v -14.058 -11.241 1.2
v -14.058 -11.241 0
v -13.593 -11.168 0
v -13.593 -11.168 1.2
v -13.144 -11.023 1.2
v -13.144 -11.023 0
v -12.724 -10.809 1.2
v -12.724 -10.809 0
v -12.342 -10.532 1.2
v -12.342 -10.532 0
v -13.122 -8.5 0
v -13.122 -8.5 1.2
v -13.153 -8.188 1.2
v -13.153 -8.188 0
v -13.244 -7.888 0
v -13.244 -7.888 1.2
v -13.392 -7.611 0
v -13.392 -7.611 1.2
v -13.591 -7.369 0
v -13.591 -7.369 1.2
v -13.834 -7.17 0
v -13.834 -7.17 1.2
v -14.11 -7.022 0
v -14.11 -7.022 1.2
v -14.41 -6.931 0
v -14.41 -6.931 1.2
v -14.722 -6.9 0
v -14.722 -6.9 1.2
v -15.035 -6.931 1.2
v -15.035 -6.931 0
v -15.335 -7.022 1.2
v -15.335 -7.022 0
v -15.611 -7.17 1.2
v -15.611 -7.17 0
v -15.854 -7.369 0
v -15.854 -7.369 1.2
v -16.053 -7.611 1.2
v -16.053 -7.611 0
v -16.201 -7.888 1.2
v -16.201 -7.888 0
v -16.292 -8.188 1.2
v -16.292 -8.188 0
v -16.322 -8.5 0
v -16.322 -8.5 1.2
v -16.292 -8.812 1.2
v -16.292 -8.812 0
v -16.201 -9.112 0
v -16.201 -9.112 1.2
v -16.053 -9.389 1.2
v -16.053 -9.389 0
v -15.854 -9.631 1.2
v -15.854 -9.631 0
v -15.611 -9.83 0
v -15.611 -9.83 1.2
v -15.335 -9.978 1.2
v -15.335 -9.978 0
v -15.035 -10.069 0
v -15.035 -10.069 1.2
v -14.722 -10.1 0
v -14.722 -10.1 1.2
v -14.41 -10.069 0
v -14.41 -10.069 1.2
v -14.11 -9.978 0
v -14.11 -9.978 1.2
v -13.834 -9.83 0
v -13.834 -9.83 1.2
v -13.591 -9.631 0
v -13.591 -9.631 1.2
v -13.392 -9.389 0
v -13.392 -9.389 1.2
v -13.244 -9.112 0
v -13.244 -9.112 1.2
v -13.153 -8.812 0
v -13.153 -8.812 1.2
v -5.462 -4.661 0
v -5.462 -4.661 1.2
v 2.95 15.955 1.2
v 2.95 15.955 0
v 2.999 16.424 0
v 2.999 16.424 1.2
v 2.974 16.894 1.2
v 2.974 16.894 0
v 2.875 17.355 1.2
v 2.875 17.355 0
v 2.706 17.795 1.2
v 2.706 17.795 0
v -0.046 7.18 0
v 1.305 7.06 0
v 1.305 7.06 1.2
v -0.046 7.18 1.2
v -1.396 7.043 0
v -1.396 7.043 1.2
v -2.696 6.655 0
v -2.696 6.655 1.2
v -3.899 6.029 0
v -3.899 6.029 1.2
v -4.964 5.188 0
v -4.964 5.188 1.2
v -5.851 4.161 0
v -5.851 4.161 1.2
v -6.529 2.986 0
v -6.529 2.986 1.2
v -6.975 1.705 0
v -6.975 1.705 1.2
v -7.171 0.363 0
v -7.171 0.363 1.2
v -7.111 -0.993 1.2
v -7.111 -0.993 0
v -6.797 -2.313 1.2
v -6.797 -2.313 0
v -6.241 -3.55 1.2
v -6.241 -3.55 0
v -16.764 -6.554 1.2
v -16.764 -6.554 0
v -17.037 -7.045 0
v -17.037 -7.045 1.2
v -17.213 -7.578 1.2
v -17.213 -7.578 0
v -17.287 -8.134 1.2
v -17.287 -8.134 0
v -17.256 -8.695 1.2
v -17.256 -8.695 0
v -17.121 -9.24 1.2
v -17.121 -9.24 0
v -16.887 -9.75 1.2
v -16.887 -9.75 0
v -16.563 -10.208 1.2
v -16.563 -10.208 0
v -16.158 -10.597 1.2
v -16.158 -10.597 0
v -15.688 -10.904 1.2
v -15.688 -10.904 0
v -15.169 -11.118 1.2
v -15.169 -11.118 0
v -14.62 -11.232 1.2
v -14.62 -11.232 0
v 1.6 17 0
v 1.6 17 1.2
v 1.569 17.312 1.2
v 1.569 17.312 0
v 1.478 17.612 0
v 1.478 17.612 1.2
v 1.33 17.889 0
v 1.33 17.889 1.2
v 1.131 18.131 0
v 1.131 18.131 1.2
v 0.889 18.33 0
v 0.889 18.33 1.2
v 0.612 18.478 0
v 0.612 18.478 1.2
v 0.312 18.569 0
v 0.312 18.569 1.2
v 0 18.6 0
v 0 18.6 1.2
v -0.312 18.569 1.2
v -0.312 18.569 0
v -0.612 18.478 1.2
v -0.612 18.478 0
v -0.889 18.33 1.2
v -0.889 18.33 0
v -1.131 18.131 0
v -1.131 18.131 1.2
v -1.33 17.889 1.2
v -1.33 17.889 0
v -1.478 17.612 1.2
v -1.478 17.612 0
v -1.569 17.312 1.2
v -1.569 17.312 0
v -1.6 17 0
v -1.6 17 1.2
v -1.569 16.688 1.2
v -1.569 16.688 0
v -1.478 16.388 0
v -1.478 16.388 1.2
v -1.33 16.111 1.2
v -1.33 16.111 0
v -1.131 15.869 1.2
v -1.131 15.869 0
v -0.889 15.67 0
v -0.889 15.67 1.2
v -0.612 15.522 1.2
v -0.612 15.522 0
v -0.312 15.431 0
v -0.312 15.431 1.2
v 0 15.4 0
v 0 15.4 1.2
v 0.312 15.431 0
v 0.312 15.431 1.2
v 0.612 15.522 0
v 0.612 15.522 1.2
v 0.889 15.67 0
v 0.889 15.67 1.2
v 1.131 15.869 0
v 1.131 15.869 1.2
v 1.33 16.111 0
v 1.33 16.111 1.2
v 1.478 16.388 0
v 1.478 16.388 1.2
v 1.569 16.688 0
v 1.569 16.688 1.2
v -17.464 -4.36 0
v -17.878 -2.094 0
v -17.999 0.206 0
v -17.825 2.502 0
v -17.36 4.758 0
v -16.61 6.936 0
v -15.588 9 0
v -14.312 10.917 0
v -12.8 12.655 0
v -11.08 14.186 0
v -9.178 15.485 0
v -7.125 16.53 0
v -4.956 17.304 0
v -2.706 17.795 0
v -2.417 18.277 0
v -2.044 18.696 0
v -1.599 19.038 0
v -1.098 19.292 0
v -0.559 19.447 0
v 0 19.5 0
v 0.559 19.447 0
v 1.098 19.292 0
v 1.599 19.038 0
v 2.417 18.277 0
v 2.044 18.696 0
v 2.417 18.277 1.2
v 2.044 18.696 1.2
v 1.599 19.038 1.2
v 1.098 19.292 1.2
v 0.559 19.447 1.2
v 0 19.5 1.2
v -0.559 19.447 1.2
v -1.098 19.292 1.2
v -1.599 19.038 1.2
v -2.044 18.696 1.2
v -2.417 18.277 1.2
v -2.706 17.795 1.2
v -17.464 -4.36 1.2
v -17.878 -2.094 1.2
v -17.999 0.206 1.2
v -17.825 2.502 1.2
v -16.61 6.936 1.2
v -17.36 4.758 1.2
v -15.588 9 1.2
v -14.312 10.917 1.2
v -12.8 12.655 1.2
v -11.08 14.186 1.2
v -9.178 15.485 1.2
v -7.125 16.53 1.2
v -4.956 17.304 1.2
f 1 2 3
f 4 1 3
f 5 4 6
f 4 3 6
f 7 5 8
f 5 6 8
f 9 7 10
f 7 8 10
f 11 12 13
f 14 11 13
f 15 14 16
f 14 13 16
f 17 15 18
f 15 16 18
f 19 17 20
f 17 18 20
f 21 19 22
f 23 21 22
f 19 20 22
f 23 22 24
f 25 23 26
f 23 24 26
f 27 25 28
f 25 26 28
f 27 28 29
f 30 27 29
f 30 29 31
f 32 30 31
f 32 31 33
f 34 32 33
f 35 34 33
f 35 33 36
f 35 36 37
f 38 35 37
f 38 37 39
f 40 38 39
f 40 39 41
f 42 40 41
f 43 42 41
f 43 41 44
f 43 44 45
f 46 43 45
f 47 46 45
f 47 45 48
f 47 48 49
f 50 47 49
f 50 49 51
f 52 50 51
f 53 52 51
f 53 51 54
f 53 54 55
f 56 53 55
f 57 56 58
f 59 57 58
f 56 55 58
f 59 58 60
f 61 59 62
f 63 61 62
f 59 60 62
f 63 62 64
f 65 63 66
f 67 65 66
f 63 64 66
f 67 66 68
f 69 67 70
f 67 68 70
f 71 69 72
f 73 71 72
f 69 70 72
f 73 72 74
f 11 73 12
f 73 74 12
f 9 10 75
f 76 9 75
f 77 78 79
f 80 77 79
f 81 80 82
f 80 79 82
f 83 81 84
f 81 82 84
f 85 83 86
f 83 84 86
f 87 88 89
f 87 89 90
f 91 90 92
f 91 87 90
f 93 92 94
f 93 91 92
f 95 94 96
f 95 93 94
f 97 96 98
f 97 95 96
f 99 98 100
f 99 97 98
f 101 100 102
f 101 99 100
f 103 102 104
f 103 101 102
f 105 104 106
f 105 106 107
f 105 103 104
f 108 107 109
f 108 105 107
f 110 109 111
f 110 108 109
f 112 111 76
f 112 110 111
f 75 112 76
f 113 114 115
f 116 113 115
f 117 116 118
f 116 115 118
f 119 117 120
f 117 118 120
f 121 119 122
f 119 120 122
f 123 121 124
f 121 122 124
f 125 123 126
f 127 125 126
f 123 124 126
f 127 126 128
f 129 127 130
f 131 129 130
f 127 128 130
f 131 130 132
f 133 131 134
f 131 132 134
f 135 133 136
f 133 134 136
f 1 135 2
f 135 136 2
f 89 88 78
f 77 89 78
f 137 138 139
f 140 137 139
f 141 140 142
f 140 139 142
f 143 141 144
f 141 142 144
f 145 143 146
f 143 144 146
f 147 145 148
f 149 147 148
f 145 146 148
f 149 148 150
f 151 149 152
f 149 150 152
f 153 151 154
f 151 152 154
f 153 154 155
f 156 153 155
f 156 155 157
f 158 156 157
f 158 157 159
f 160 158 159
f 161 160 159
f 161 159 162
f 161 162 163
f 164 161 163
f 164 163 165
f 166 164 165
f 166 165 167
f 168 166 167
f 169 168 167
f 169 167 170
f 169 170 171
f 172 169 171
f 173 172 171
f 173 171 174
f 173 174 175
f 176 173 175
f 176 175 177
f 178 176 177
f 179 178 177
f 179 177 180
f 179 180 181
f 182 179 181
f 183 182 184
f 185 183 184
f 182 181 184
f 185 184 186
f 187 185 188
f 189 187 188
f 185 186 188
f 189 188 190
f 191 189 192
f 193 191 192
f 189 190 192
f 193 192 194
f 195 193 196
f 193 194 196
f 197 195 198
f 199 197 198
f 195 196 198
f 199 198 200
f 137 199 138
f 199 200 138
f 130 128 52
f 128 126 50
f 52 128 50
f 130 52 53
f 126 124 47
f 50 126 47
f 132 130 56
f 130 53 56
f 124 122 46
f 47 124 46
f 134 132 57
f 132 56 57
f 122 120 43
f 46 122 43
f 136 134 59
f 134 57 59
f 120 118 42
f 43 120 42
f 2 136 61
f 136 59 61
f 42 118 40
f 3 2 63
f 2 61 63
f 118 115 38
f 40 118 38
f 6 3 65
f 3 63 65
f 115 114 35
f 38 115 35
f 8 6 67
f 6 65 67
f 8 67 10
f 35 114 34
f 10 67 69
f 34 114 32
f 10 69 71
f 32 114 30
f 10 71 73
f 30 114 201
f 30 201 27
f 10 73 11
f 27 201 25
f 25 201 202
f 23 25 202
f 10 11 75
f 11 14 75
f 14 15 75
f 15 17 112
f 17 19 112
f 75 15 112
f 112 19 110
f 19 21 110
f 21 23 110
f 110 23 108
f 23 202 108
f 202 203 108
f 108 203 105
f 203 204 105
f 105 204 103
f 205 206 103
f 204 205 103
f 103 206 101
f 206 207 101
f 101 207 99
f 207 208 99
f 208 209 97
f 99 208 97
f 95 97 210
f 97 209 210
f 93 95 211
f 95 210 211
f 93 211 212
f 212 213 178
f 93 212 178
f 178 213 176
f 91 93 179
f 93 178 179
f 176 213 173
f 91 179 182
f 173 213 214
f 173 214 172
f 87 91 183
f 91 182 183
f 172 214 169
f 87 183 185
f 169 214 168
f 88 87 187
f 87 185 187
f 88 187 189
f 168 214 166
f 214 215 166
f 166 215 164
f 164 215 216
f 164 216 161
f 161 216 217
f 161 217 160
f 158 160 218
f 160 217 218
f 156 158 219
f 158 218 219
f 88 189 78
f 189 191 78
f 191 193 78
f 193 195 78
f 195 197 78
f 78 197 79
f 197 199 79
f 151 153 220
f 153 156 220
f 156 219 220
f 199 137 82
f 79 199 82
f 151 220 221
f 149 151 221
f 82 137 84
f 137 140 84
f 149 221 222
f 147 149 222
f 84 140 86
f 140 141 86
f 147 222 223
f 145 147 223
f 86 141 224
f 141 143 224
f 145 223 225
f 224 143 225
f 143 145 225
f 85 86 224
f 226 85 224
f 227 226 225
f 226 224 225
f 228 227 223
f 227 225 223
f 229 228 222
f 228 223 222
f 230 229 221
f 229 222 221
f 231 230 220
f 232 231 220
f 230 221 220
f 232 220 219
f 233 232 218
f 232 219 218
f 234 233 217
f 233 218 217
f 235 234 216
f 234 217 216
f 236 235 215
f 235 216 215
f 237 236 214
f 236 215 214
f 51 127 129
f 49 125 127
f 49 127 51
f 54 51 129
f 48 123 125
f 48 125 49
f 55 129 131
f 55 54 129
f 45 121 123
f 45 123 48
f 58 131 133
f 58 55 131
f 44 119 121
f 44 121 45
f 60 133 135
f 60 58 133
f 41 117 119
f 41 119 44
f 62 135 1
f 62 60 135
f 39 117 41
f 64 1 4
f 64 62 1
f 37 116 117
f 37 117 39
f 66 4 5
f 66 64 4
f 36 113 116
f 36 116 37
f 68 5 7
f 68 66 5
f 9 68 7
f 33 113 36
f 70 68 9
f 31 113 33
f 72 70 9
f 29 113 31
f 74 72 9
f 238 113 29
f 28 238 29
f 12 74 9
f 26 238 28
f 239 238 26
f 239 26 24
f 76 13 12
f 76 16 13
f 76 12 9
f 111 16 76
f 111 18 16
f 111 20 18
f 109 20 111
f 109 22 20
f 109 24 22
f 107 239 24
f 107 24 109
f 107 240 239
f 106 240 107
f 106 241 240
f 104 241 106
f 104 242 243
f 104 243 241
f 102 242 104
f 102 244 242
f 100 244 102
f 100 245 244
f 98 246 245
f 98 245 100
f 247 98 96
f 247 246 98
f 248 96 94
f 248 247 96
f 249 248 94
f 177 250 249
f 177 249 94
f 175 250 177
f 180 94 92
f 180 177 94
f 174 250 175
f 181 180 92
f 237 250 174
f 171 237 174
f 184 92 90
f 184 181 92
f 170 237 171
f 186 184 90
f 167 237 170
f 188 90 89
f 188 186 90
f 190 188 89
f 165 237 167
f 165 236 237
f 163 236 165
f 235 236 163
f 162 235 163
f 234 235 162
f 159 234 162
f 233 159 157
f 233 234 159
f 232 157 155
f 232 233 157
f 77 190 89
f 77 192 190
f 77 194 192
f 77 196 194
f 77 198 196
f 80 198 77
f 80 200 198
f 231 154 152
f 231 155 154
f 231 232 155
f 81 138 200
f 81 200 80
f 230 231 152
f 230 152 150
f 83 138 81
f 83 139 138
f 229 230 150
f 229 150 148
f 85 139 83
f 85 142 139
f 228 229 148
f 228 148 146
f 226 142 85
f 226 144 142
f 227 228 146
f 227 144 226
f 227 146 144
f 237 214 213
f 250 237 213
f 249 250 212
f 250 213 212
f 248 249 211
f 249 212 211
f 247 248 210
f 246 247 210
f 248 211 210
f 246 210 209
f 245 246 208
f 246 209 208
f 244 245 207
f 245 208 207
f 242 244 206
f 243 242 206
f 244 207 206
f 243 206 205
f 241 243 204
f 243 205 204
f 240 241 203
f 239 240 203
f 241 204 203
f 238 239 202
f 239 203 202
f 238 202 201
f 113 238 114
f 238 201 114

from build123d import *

# Parameters (mm, degrees)
SKETCH_1_R          = 7.18
EXTRUDE_1_DEPTH     = 1.2
SKETCH_2_R          = 1.6
CUT_EXTRUDE_1_DEPTH = 10
CUT_EXTRUDE_START   = -11.2
CUT_EXTRUDE_4_DEPTH = 11.2


with BuildPart() as part:
    # 草图1 → 凸台-拉伸1 (new body)
    with BuildSketch(Plane.XY):
        with BuildLine():
            ThreePointArc((-14.058374697, -11.241089844), (0, -18), (14.058374697, -11.241089844))
            ThreePointArc((14.058374697, -11.241089844), (16.887495374, -9.75), (16.76425672, -6.554364701))
            ThreePointArc((16.76425672, -6.554364701), (15.588457268, 9), (2.705882023, 17.795454545))
            ThreePointArc((2.705882023, 17.795454545), (0, 19.5), (-2.705882023, 17.795454545))
            ThreePointArc((-2.705882023, 17.795454545), (-15.588457268, 9), (-16.76425672, -6.554364701))
            ThreePointArc((-16.76425672, -6.554364701), (-16.887495374, -9.75), (-14.058374697, -11.241089844))
        make_face()
        Circle(SKETCH_1_R, mode=Mode.SUBTRACT)
    extrude(amount=EXTRUDE_1_DEPTH)

    # 草图2 → 切除-拉伸1 (cut)
    with BuildSketch(Plane.XY.offset(1.2)):
        with Locations((0, 17)):
            Circle(SKETCH_2_R)
        with Locations((14.722431864, -8.5)):
            Circle(SKETCH_2_R)
        with Locations((-14.722431864, -8.5)):
            Circle(SKETCH_2_R)
    extrude(amount=-CUT_EXTRUDE_1_DEPTH, mode=Mode.SUBTRACT)

    # 草图4 → 切除-拉伸4 (cut)
    with BuildSketch(Plane.XY.offset(11.2).offset(CUT_EXTRUDE_START)):
        with BuildLine():
            Line((0, 0), (2.949996498, 15.954545455))
            ThreePointArc((2.949996498, 15.954545455), (0.928512003, 19.352694421), (-2.705882023, 17.795454545))
            Line((-2.705882023, 17.795454545), (-0.609984312, 23.633101635))
            Line((-0.609984312, 23.633101635), (9.450831052, 25.36709559))
            Line((9.450831052, 25.36709559), (30.272136365, -16.841499514))
            Line((30.272136365, -16.841499514), (-5.709784057, -19.189026381))
            Line((-5.709784057, -19.189026381), (-25.420914817, -11.863123573))
            Line((-25.420914817, -11.863123573), (-16.76425672, -6.554364701))
            ThreePointArc((-16.76425672, -6.554364701), (-16.295668999, -10.480462193), (-12.34204342, -10.532044636))
            Line((-12.34204342, -10.532044636), (0, 0))
        make_face()
    extrude(amount=CUT_EXTRUDE_4_DEPTH, mode=Mode.SUBTRACT)


solid = part.part
